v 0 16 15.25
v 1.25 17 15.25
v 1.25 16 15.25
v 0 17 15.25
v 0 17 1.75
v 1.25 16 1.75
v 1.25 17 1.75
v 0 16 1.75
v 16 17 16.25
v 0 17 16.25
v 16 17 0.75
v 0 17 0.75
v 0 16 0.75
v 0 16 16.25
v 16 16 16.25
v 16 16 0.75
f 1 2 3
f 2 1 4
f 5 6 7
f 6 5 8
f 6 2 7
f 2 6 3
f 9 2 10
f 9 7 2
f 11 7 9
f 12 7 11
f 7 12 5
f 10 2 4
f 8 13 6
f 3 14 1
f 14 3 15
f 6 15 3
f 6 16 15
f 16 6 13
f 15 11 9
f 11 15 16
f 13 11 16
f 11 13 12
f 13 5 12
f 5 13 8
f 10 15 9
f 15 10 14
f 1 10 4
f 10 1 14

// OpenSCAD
$fn = 30;
box_width = 16;
pole_hieght = 15.5;
sheet_thickness = 3/4;
pole_thickness = 1.5;
wall_thickness = 1/4; 
base_thickness = 25.5;
holder_thickness = 1;


module sheet(width, length, thickness,
    xness, yness, vertical){

    translate([xness,yness,vertical]){
    cube([width,length,thickness]);   
    } 
}

color([0,1,0])
sheet(13.5,1,13.5,
1.5 - .25,box_width,
1.75);

color([0,0,1])
sheet(box_width,holder_thickness,holder_thickness,
0,box_width,sheet_thickness);

color([0,0,1])
sheet(box_width,holder_thickness,holder_thickness,
0,box_width,
pole_hieght - 1/4);

color([0,.3,.5])
sheet(holder_thickness + .25,holder_thickness,pole_hieght - 2,
box_width - pole_thickness + .25,box_width,sheet_thickness + 1);
